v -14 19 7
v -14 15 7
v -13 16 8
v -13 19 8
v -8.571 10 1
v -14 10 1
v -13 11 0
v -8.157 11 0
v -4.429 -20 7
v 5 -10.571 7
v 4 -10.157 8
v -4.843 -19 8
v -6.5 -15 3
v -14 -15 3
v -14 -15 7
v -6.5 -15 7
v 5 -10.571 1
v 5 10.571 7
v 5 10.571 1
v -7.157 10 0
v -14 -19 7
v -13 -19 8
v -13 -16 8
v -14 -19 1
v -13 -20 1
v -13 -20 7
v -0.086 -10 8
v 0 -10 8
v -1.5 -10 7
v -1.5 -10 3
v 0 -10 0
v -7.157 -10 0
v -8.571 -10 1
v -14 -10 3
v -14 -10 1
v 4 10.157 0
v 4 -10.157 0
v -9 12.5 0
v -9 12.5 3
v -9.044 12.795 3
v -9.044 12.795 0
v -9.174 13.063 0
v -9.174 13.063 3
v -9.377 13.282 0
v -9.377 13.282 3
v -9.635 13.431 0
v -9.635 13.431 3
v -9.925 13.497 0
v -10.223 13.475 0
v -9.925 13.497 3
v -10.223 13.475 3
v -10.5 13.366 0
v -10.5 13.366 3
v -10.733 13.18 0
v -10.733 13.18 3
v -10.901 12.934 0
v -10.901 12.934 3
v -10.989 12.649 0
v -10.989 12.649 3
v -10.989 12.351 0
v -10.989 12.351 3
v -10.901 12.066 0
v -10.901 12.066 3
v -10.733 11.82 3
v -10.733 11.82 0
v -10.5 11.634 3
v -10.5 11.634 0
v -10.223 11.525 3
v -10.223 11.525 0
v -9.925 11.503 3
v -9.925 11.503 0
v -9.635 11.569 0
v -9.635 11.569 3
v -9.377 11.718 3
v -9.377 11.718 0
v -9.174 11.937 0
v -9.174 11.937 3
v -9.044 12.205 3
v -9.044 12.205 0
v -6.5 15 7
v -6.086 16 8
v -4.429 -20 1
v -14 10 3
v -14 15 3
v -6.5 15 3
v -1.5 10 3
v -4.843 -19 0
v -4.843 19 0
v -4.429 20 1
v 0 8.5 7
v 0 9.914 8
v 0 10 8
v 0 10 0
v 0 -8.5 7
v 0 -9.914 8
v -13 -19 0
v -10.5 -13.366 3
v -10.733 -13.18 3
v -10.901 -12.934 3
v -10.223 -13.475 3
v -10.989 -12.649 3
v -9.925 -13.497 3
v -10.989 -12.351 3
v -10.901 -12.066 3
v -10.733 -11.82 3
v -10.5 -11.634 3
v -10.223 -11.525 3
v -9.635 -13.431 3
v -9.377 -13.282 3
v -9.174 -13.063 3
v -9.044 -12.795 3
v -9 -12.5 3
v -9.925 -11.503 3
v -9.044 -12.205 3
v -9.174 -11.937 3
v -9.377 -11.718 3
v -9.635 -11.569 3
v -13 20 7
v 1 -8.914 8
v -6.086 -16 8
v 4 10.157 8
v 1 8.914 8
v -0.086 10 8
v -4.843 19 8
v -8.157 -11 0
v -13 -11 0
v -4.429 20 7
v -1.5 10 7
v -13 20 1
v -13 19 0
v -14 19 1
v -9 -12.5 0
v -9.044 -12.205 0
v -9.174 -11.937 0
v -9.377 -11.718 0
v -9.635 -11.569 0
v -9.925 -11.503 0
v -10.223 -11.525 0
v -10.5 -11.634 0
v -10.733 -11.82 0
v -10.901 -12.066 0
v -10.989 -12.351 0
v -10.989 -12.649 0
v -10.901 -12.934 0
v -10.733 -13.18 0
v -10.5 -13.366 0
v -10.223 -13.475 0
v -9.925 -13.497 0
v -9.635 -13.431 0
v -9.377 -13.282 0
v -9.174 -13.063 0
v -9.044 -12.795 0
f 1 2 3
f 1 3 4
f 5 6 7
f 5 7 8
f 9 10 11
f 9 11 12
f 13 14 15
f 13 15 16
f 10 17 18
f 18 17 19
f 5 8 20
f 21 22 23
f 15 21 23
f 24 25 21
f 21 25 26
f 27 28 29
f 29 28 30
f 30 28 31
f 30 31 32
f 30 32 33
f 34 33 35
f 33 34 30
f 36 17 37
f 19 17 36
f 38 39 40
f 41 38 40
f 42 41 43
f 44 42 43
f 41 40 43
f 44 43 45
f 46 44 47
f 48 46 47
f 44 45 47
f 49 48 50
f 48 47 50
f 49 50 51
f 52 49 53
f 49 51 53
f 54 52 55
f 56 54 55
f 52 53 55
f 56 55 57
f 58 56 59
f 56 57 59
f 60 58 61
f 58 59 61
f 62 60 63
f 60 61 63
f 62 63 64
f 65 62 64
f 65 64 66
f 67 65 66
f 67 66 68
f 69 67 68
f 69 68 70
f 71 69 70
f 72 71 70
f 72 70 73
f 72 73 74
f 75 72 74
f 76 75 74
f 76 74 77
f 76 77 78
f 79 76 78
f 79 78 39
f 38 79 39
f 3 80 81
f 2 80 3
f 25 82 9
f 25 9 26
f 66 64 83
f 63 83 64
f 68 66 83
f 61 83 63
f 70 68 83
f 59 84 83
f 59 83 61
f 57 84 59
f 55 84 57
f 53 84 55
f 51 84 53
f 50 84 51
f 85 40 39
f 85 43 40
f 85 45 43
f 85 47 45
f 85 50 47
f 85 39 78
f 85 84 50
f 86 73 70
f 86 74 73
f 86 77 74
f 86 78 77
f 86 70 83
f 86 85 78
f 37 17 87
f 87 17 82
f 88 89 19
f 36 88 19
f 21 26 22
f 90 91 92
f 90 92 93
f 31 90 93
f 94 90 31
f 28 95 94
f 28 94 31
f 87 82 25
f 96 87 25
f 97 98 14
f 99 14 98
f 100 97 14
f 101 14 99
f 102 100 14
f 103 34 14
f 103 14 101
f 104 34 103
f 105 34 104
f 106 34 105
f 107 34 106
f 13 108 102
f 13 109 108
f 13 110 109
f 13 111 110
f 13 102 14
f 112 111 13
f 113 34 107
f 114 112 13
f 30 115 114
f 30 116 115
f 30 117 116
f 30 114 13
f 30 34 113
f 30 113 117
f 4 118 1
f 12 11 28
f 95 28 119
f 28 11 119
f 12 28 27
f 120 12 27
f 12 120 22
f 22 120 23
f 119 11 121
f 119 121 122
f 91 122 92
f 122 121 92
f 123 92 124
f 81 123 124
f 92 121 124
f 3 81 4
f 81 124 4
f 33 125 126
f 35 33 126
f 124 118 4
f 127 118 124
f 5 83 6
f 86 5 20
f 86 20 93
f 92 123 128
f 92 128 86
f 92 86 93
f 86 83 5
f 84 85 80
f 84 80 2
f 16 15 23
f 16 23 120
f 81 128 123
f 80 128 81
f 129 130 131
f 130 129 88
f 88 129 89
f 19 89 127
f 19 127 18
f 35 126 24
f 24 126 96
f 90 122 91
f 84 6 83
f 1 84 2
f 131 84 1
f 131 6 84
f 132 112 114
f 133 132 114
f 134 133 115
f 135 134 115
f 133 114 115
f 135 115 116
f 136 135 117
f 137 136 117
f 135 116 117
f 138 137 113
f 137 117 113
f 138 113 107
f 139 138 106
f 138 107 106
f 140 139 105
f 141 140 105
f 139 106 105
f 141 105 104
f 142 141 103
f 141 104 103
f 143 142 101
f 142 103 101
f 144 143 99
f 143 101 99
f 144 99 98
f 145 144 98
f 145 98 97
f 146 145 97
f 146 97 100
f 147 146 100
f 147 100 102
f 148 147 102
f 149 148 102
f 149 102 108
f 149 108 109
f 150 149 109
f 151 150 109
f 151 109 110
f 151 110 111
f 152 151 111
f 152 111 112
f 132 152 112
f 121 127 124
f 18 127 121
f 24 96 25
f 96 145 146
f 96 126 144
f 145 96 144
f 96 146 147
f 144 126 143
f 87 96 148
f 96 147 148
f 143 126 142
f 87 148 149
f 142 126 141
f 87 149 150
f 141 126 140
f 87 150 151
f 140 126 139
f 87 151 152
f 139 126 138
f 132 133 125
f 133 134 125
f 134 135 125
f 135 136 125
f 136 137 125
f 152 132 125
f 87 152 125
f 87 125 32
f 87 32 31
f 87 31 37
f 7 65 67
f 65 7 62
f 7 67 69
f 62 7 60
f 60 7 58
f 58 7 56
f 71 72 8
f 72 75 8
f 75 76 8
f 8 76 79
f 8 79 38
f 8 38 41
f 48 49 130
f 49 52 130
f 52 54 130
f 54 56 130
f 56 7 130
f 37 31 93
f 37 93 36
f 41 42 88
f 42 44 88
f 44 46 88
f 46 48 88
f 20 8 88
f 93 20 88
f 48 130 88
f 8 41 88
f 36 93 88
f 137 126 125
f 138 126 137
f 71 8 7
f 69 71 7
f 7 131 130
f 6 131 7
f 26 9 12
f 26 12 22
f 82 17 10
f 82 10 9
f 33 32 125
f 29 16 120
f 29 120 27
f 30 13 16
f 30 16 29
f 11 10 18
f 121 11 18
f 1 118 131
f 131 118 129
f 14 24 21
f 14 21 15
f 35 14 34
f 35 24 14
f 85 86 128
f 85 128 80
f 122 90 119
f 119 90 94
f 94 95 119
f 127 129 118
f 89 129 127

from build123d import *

# Parameters (mm, degrees)
EXTRUDE_1_DEPTH          = 3
EXTRUDE_2_DEPTH          = 5
SKETCH_4_R               = 1
CUT_EXTRUDE_1_DEPTH      = 8
CHAMFER_1_SIZE           = 1
CUT_EXTRUDE_3_DEPTH      = 26.690465157
CUT_EXTRUDE_3_DEPTH_BACK = 26.690465157


with BuildPart() as part:
    # 草图1 → 凸台-拉伸1 (new body)
    with BuildSketch(Plane.XY):
        Polygon((-5, -6.428932188), (-8.571067812, -10), (-14, -10), (-14, -15), (-6.5, -15), (0, -8.5), (0, 0), (0, 8.5), (-6.5, 15), (-14, 15), (-14, 10), (-8.571067812, 10), (-5, 6.428932188), (-5, 0), align=None)
        Polygon((-4.428932188, -20), (-14, -20), (-14, -15), (-6.5, -15), (0, -8.5), (0, 0), (0, 8.5), (-6.5, 15), (-14, 15), (-14, 20), (-4.428932188, 20), (5, 10.571067812), (5, 0), (5, -10.571067812), align=None)
    extrude(amount=EXTRUDE_1_DEPTH)

    # 草图3 → 凸台-拉伸2 (add)
    with BuildSketch(Plane.XY.offset(3)):
        Polygon((-14, -20), (-14, -15), (-6.5, -15), (0, -8.5), (0, 0), (0, 8.5), (-6.5, 15), (-14, 15), (-14, 20), (-4.428932188, 20), (5, 10.571067812), (5, 0), (5, -10.571067812), (-4.428932188, -20), align=None)
    extrude(amount=EXTRUDE_2_DEPTH)

    # 草图4 → 切除-拉伸1 (cut)
    with BuildSketch(Plane.XY.offset(3)):
        with Locations((-10, 12.5)):
            Circle(SKETCH_4_R)
        with Locations((-10, -12.5)):
            Circle(SKETCH_4_R)
    extrude(amount=-CUT_EXTRUDE_1_DEPTH, mode=Mode.SUBTRACT)

    # 倒角1
    chamfer_1_edges = [part.edges().sort_by_distance(p)[0] for p in [
        (-11.285533906, -10, 0),
        (-6.785533906, -8.214466094, 0),
        (-5, 0, 0),
        (-6.785533906, 8.214466094, 0),
        (-11.285533906, 10, 0),
        (-14, 15, 0),
        (-9.214466094, 20, 0),
        (0.285533906, 15.285533906, 0),
        (5, 0, 0),
        (0.285533906, -15.285533906, 0),
        (-9.214466094, -20, 0),
        (-14, -15, 0),
        (-14, 20, 4),
        (-14, -20, 4),
        (-9.214466094, -20, 8),
        (0.285533906, -15.285533906, 8),
        (5, 0, 8),
        (0.285533906, 15.285533906, 8),
        (-9.214466094, 20, 8),
        (-14, 17.5, 8),
        (-10.25, 15, 8),
        (-3.25, 11.75, 8),
        (0, 0, 8),
        (-3.25, -11.75, 8),
        (-10.25, -15, 8),
        (-14, -17.5, 8),
    ]]
    chamfer(chamfer_1_edges, length=CHAMFER_1_SIZE)

    # 草图6 → 切除-拉伸3 (cut, two sides: drawn at the far end of the back side and taken through both)
    with BuildSketch(Plane(origin=(0, 0, 0), x_dir=(-1, 0, 0), z_dir=(0, 0, -1)).offset(-CUT_EXTRUDE_3_DEPTH_BACK)):
        Polygon((84.424659409, 10), (8.571067812, 10), (0, 10), (0, -10), (8.571067812, -10), (84.424659409, -10), (236.131842603, -10), (236.131842603, 10), align=None)
    extrude(amount=CUT_EXTRUDE_3_DEPTH + CUT_EXTRUDE_3_DEPTH_BACK, mode=Mode.SUBTRACT)


solid = part.part
